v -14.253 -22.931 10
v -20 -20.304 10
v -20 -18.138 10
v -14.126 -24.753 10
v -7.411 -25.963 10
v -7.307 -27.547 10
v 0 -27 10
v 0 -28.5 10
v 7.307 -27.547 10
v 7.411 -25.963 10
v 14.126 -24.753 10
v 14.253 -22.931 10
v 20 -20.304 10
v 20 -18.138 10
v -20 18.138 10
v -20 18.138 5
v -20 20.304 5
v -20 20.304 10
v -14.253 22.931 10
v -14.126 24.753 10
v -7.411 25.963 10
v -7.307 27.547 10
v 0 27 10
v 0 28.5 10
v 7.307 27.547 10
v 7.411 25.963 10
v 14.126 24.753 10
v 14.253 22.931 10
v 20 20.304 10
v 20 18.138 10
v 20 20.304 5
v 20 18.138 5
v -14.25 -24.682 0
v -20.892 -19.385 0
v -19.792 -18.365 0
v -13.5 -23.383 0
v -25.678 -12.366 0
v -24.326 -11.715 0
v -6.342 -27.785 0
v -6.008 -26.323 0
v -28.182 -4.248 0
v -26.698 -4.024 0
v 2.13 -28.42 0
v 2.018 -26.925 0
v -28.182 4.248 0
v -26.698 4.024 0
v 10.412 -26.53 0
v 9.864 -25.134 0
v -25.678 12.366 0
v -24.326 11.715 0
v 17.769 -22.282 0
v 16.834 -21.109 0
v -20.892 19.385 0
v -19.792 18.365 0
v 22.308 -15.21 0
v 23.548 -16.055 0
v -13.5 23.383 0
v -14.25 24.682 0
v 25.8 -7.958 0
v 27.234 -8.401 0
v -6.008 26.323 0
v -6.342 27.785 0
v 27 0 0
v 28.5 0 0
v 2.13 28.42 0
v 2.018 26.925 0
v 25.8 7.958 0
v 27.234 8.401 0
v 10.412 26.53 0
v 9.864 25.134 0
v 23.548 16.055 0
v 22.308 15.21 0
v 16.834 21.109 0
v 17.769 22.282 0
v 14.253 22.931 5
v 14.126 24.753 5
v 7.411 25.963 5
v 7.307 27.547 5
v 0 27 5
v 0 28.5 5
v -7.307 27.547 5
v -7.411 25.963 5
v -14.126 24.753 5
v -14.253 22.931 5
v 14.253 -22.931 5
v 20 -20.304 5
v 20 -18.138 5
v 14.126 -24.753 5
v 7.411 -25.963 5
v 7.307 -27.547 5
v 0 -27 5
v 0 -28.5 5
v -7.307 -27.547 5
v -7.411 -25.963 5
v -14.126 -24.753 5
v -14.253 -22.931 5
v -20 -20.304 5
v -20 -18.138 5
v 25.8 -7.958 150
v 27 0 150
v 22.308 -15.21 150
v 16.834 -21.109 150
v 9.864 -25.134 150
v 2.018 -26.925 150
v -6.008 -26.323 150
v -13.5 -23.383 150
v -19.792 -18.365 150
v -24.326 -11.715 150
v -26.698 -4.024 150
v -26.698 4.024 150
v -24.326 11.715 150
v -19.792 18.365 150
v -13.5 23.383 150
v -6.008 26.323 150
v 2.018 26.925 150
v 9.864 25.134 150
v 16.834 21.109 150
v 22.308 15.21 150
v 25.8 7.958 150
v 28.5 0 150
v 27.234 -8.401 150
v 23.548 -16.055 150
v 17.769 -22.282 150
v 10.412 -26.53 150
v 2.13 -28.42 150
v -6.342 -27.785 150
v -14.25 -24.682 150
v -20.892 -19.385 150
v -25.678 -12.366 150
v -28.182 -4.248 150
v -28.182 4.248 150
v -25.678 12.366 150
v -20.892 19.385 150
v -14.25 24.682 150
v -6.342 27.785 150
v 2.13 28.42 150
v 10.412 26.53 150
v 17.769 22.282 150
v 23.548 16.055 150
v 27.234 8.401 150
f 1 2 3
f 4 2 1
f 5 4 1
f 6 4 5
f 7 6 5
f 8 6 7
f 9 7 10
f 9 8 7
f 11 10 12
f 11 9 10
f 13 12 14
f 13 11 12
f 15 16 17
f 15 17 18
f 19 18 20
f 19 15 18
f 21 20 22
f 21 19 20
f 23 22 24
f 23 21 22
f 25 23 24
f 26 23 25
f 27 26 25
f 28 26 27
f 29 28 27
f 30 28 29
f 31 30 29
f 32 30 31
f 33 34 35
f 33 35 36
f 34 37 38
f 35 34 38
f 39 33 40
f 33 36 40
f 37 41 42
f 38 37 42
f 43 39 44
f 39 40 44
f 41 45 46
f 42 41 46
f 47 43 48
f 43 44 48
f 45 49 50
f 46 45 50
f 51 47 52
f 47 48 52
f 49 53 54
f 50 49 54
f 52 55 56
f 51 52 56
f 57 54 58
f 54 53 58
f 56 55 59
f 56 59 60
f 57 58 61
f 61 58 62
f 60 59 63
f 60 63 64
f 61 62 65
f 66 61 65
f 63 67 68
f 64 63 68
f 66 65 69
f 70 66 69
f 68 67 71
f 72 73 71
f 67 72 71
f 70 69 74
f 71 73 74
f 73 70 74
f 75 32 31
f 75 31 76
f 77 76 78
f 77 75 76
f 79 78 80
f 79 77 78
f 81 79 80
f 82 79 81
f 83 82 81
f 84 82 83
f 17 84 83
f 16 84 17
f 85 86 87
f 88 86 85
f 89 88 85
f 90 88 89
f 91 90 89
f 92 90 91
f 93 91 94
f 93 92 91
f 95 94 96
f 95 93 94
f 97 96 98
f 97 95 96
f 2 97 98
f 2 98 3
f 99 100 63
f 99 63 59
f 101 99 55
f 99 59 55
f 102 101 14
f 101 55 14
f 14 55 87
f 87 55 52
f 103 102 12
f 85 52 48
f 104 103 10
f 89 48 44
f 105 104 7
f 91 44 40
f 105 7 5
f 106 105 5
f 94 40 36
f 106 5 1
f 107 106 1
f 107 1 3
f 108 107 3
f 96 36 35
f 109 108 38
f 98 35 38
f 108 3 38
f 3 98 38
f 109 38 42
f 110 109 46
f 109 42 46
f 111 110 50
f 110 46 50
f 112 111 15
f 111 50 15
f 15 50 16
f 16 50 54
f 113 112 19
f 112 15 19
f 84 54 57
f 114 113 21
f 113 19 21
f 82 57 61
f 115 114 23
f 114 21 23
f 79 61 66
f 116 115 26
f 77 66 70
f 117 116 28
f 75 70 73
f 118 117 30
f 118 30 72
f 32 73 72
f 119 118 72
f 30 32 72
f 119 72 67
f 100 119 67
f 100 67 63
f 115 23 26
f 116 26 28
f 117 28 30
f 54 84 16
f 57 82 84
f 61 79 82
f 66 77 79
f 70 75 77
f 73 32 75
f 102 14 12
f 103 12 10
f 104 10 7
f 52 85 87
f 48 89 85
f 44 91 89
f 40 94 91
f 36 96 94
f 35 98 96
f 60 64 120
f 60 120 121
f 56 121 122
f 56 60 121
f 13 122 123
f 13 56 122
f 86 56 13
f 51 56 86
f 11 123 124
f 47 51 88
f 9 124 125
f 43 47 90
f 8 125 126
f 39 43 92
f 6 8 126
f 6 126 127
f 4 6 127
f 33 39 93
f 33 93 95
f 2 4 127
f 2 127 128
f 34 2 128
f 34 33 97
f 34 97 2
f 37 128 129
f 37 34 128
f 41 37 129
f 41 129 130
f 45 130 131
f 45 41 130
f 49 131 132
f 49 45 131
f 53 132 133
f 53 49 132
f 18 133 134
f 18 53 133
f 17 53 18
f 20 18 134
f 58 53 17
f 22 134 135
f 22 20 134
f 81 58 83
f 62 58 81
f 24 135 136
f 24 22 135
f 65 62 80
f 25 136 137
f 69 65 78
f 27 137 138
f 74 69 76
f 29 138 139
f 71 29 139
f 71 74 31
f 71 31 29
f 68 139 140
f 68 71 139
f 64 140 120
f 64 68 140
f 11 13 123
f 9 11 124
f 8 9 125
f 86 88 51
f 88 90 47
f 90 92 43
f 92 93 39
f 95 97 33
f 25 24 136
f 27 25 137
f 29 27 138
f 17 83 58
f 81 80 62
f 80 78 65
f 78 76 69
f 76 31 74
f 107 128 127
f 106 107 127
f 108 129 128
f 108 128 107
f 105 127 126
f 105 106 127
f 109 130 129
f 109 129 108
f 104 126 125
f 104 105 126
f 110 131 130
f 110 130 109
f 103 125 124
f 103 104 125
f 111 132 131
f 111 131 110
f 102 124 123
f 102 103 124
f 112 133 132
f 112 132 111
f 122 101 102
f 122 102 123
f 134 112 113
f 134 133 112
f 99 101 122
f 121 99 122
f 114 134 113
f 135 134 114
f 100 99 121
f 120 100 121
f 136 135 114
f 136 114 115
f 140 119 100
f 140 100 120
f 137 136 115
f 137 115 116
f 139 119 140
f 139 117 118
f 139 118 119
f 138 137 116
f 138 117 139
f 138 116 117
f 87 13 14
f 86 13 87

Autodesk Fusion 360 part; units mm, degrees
sketch "Sketch1" plane through (0, 0, 0) normal (0, 0, 1) x (1, 0, 0)
  circle A0 centre (0, 0) radius 28.5
  dimension "d1" = 57
extrude "Extrude1" add sketch "Sketch1" along normal blind 150
sketch "Sketch2" plane through (0, 0, 0) normal (0, 0, -1) x (1, 0, 0)
  circle A0 centre (0, 0) radius 28.5
  circle A1 centre (0, 0) radius 27
  dimension "d4" = 54
extrude "Extrude2" cut sketch "Sketch2" against normal blind 530 contours A1
sketch "Sketch3" plane through (0, 0, 0) normal (0, 1, 0) x (1, 0, 0)
  line L0 (0, 0) -> (20, 0)
  line L1 (20, 0) -> (20, -5)
  line L2 (20, -5) -> (-20, -5)
  line L3 (-20, -5) -> (-20, -10)
  line L4 (-20, -10) -> (20, -10)
  line L5 (20, -10) -> (20, -5)
  dimension "d7" = 20
  dimension "d8" = 40
  dimension "d9" = 5
  dimension "d10" = 5
extrude "Extrude3" cut sketch "Sketch3" along normal blind 50 and the other way blind 35
